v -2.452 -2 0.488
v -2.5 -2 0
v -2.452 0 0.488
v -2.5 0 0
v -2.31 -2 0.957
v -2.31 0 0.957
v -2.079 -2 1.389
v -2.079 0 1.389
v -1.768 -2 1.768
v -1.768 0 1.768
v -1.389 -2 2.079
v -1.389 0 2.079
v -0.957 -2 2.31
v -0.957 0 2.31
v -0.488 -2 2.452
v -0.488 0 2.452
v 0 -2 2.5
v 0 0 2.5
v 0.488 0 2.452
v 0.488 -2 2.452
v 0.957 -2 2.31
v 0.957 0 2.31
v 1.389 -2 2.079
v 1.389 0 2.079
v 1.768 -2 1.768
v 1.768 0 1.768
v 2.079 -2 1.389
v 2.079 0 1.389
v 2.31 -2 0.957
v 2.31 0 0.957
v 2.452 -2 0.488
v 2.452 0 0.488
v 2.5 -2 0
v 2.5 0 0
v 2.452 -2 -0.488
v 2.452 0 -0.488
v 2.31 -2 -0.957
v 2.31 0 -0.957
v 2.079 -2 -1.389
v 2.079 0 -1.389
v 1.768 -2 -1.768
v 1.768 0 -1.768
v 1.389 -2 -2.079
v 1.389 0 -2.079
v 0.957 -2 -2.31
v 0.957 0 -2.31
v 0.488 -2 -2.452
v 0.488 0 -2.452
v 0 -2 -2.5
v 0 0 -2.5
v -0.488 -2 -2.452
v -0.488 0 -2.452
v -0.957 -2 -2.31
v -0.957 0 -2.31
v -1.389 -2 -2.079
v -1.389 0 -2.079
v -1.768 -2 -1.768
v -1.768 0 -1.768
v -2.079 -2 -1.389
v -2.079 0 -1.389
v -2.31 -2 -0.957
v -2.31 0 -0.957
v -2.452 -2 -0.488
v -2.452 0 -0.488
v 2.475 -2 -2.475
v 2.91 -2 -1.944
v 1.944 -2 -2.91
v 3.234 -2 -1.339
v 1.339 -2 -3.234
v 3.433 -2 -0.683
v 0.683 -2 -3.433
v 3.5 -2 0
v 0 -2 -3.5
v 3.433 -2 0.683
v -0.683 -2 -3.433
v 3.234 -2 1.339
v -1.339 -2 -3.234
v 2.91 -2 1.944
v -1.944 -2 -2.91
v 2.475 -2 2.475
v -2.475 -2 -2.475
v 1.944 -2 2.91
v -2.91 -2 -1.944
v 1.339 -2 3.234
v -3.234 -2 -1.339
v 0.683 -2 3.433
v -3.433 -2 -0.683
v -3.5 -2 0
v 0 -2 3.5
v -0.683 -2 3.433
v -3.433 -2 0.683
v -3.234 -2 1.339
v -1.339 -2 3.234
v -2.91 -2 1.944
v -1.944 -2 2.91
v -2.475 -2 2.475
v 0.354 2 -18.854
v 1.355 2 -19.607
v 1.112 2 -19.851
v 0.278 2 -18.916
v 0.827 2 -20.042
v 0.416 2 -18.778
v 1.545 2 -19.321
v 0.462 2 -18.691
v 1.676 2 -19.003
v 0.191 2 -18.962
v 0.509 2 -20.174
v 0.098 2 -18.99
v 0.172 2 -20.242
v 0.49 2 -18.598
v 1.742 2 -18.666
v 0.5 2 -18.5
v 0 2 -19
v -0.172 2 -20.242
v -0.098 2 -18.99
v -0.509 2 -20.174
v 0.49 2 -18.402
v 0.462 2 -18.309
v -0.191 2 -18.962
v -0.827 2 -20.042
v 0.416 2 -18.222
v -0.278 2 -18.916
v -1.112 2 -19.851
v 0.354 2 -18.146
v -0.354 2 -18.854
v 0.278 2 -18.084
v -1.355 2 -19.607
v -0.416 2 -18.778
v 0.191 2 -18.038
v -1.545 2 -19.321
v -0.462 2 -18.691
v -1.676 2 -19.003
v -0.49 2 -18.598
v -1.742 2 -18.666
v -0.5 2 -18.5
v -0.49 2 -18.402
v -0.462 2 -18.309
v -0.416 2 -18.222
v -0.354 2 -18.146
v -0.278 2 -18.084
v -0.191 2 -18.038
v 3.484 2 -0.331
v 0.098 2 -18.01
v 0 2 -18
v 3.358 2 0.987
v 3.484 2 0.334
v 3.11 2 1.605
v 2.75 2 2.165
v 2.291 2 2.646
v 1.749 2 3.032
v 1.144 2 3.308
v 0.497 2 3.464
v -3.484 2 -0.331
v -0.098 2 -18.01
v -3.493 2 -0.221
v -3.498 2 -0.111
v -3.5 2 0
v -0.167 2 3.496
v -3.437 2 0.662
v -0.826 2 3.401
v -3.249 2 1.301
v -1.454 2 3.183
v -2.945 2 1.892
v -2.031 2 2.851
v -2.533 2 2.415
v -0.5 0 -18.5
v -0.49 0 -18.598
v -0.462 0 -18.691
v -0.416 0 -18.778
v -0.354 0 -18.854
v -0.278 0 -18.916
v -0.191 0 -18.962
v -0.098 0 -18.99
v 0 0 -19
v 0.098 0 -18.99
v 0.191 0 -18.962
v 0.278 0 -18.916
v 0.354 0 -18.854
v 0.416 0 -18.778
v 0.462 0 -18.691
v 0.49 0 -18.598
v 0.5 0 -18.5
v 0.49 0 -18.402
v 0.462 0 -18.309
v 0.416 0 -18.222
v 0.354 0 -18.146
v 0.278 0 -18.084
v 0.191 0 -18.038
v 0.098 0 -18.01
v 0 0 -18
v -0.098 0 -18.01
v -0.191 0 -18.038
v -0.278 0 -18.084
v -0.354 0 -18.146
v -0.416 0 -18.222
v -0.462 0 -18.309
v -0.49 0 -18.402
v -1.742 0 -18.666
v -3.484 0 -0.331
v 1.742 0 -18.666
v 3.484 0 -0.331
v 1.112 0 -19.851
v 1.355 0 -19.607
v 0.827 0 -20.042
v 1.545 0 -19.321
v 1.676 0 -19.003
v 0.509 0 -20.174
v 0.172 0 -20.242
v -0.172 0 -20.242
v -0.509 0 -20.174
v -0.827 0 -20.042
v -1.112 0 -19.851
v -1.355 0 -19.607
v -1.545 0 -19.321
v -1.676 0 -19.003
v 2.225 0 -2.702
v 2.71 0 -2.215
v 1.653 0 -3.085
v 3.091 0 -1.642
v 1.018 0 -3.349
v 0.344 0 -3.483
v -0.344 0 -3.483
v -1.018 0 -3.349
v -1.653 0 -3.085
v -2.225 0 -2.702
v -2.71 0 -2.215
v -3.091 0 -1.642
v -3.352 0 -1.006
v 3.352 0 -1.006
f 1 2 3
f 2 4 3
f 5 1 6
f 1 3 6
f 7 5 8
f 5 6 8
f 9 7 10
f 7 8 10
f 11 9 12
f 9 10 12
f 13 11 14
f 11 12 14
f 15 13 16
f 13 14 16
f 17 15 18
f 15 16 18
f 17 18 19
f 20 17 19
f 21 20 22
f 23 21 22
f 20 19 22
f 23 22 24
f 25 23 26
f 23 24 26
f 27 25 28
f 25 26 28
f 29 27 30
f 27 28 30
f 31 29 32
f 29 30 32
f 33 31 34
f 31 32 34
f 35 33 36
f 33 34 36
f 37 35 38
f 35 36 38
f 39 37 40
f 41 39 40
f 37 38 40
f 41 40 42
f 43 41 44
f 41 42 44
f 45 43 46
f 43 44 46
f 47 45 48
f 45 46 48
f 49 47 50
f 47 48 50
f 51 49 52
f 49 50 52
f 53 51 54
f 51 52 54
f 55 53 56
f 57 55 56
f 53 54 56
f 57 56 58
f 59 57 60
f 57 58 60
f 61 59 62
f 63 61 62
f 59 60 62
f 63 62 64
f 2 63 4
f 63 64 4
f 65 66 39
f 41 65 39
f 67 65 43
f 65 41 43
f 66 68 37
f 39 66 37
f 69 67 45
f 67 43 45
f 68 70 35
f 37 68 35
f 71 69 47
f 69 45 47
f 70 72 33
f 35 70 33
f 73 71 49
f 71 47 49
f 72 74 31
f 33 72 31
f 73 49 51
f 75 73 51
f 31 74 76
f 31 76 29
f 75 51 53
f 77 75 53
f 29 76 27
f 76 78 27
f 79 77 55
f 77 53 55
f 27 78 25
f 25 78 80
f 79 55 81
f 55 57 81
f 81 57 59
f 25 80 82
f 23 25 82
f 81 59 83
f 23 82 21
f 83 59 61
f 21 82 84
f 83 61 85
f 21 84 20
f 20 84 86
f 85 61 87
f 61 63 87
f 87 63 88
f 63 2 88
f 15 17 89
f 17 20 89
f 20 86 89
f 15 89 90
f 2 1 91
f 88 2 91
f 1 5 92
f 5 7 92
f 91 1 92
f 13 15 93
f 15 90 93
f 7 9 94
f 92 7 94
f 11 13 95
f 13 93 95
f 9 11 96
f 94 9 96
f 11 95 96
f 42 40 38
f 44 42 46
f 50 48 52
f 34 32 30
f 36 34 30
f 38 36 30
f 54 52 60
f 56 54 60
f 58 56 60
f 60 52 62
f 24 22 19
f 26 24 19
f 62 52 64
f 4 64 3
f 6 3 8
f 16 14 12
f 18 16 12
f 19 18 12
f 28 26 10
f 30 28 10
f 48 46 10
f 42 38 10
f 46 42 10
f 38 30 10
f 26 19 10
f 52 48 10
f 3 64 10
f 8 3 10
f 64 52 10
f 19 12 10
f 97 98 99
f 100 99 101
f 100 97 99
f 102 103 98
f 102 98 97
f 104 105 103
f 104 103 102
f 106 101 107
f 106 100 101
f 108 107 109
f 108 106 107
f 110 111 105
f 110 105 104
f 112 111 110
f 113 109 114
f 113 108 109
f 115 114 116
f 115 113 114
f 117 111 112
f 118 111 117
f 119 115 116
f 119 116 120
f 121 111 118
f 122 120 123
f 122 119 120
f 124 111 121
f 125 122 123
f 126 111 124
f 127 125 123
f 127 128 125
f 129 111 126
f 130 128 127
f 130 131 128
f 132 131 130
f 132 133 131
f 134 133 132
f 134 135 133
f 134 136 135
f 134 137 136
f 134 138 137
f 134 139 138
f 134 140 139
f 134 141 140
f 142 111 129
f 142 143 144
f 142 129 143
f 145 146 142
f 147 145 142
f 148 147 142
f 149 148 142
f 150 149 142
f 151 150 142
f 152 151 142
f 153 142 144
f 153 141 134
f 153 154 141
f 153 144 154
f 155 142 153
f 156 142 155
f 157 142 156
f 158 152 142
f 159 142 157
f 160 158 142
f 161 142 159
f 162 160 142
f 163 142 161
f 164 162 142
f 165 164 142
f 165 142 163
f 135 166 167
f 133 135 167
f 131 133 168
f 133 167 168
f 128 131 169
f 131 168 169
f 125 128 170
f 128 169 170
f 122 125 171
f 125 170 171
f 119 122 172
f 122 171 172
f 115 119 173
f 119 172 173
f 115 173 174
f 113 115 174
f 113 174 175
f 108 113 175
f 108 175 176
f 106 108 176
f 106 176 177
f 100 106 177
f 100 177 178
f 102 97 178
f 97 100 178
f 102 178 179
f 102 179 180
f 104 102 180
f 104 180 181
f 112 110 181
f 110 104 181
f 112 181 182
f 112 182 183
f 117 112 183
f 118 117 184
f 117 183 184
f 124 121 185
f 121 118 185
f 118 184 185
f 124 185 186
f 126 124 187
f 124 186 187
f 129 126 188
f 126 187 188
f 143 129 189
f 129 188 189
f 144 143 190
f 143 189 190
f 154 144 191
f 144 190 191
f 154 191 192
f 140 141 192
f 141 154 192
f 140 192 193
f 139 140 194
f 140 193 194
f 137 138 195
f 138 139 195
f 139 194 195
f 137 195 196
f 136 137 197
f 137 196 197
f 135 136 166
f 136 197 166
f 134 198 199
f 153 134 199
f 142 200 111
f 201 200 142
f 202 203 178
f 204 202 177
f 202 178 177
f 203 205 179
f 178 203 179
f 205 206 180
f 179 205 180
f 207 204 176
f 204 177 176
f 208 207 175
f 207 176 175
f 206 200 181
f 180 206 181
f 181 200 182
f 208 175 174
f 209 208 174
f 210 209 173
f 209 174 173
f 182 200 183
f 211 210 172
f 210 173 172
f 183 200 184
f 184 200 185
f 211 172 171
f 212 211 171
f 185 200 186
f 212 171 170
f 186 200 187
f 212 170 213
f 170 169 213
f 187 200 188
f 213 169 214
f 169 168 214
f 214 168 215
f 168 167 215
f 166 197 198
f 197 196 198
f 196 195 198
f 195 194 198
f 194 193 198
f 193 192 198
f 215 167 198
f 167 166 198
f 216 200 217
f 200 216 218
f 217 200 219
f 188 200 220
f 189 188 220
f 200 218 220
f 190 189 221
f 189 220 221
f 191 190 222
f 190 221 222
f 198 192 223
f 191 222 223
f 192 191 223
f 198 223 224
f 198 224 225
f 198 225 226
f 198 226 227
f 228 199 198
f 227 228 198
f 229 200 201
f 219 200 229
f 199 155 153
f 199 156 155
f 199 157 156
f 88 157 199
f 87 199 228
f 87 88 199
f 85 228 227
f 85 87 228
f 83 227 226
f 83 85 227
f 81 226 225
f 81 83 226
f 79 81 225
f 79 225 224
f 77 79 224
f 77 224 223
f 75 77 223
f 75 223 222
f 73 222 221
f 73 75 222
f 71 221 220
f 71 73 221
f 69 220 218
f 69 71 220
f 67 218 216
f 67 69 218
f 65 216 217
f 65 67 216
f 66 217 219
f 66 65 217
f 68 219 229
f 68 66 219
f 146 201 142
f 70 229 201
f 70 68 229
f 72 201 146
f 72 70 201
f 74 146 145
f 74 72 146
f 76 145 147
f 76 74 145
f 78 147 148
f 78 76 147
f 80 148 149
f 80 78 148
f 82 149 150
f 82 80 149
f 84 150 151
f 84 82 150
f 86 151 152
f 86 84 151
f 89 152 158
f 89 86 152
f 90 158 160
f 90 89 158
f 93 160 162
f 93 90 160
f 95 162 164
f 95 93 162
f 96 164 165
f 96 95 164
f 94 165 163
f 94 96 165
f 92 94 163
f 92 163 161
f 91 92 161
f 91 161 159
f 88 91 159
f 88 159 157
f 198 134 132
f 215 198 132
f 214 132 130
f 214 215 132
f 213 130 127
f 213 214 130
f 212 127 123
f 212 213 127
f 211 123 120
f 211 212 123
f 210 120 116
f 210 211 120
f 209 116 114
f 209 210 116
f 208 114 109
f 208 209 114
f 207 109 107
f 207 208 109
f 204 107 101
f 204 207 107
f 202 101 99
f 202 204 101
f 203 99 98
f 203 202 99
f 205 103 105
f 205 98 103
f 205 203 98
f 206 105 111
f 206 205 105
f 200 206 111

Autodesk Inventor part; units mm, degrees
ref_plane "YZ Plane" through (0, 0, 0) normal (1, 0, 0) x (0, 1, 0)
ref_plane "XZ Plane" through (0, 0, 0) normal (0, 1, 0) x (-1, 0, 0)
ref_plane "XY Plane" through (0, 0, 0) normal (0, 0, 1) x (1, 0, 0)
sketch "Sketch1" plane through (0, 0, 0) normal (0, 1, 0) x (-1, 0, 0)
  circle A0 centre (0, 0) radius 3.5
  line L0 (0, 3.5) -> (0, -18.5)
  circle A1 centre (0, -18.5) radius 1.75
  line L1 (1.7422, -18.6655) -> (3.4843, -0.3311)
  line L2 (-1.7422, -18.6655) -> (-3.4843, -0.3311)
  circle A2 centre (0, 0) radius 2.5
  circle A3 centre (0, -18.5) radius 0.5
  dimension "d0" = 7
  dimension "d1" = 22
  dimension "d2" = 3.5
  dimension "d3" = 5
  dimension "d8" = 1
extrude "Extrusion1" add sketch "Sketch1" along normal blind 2
extrude "Extrusion2" add sketch "Sketch1" against normal blind 2 contours A0 L0 A2 | L0 A2 A0
properties part number "servohorn" material "Acetal Resin, Black"
